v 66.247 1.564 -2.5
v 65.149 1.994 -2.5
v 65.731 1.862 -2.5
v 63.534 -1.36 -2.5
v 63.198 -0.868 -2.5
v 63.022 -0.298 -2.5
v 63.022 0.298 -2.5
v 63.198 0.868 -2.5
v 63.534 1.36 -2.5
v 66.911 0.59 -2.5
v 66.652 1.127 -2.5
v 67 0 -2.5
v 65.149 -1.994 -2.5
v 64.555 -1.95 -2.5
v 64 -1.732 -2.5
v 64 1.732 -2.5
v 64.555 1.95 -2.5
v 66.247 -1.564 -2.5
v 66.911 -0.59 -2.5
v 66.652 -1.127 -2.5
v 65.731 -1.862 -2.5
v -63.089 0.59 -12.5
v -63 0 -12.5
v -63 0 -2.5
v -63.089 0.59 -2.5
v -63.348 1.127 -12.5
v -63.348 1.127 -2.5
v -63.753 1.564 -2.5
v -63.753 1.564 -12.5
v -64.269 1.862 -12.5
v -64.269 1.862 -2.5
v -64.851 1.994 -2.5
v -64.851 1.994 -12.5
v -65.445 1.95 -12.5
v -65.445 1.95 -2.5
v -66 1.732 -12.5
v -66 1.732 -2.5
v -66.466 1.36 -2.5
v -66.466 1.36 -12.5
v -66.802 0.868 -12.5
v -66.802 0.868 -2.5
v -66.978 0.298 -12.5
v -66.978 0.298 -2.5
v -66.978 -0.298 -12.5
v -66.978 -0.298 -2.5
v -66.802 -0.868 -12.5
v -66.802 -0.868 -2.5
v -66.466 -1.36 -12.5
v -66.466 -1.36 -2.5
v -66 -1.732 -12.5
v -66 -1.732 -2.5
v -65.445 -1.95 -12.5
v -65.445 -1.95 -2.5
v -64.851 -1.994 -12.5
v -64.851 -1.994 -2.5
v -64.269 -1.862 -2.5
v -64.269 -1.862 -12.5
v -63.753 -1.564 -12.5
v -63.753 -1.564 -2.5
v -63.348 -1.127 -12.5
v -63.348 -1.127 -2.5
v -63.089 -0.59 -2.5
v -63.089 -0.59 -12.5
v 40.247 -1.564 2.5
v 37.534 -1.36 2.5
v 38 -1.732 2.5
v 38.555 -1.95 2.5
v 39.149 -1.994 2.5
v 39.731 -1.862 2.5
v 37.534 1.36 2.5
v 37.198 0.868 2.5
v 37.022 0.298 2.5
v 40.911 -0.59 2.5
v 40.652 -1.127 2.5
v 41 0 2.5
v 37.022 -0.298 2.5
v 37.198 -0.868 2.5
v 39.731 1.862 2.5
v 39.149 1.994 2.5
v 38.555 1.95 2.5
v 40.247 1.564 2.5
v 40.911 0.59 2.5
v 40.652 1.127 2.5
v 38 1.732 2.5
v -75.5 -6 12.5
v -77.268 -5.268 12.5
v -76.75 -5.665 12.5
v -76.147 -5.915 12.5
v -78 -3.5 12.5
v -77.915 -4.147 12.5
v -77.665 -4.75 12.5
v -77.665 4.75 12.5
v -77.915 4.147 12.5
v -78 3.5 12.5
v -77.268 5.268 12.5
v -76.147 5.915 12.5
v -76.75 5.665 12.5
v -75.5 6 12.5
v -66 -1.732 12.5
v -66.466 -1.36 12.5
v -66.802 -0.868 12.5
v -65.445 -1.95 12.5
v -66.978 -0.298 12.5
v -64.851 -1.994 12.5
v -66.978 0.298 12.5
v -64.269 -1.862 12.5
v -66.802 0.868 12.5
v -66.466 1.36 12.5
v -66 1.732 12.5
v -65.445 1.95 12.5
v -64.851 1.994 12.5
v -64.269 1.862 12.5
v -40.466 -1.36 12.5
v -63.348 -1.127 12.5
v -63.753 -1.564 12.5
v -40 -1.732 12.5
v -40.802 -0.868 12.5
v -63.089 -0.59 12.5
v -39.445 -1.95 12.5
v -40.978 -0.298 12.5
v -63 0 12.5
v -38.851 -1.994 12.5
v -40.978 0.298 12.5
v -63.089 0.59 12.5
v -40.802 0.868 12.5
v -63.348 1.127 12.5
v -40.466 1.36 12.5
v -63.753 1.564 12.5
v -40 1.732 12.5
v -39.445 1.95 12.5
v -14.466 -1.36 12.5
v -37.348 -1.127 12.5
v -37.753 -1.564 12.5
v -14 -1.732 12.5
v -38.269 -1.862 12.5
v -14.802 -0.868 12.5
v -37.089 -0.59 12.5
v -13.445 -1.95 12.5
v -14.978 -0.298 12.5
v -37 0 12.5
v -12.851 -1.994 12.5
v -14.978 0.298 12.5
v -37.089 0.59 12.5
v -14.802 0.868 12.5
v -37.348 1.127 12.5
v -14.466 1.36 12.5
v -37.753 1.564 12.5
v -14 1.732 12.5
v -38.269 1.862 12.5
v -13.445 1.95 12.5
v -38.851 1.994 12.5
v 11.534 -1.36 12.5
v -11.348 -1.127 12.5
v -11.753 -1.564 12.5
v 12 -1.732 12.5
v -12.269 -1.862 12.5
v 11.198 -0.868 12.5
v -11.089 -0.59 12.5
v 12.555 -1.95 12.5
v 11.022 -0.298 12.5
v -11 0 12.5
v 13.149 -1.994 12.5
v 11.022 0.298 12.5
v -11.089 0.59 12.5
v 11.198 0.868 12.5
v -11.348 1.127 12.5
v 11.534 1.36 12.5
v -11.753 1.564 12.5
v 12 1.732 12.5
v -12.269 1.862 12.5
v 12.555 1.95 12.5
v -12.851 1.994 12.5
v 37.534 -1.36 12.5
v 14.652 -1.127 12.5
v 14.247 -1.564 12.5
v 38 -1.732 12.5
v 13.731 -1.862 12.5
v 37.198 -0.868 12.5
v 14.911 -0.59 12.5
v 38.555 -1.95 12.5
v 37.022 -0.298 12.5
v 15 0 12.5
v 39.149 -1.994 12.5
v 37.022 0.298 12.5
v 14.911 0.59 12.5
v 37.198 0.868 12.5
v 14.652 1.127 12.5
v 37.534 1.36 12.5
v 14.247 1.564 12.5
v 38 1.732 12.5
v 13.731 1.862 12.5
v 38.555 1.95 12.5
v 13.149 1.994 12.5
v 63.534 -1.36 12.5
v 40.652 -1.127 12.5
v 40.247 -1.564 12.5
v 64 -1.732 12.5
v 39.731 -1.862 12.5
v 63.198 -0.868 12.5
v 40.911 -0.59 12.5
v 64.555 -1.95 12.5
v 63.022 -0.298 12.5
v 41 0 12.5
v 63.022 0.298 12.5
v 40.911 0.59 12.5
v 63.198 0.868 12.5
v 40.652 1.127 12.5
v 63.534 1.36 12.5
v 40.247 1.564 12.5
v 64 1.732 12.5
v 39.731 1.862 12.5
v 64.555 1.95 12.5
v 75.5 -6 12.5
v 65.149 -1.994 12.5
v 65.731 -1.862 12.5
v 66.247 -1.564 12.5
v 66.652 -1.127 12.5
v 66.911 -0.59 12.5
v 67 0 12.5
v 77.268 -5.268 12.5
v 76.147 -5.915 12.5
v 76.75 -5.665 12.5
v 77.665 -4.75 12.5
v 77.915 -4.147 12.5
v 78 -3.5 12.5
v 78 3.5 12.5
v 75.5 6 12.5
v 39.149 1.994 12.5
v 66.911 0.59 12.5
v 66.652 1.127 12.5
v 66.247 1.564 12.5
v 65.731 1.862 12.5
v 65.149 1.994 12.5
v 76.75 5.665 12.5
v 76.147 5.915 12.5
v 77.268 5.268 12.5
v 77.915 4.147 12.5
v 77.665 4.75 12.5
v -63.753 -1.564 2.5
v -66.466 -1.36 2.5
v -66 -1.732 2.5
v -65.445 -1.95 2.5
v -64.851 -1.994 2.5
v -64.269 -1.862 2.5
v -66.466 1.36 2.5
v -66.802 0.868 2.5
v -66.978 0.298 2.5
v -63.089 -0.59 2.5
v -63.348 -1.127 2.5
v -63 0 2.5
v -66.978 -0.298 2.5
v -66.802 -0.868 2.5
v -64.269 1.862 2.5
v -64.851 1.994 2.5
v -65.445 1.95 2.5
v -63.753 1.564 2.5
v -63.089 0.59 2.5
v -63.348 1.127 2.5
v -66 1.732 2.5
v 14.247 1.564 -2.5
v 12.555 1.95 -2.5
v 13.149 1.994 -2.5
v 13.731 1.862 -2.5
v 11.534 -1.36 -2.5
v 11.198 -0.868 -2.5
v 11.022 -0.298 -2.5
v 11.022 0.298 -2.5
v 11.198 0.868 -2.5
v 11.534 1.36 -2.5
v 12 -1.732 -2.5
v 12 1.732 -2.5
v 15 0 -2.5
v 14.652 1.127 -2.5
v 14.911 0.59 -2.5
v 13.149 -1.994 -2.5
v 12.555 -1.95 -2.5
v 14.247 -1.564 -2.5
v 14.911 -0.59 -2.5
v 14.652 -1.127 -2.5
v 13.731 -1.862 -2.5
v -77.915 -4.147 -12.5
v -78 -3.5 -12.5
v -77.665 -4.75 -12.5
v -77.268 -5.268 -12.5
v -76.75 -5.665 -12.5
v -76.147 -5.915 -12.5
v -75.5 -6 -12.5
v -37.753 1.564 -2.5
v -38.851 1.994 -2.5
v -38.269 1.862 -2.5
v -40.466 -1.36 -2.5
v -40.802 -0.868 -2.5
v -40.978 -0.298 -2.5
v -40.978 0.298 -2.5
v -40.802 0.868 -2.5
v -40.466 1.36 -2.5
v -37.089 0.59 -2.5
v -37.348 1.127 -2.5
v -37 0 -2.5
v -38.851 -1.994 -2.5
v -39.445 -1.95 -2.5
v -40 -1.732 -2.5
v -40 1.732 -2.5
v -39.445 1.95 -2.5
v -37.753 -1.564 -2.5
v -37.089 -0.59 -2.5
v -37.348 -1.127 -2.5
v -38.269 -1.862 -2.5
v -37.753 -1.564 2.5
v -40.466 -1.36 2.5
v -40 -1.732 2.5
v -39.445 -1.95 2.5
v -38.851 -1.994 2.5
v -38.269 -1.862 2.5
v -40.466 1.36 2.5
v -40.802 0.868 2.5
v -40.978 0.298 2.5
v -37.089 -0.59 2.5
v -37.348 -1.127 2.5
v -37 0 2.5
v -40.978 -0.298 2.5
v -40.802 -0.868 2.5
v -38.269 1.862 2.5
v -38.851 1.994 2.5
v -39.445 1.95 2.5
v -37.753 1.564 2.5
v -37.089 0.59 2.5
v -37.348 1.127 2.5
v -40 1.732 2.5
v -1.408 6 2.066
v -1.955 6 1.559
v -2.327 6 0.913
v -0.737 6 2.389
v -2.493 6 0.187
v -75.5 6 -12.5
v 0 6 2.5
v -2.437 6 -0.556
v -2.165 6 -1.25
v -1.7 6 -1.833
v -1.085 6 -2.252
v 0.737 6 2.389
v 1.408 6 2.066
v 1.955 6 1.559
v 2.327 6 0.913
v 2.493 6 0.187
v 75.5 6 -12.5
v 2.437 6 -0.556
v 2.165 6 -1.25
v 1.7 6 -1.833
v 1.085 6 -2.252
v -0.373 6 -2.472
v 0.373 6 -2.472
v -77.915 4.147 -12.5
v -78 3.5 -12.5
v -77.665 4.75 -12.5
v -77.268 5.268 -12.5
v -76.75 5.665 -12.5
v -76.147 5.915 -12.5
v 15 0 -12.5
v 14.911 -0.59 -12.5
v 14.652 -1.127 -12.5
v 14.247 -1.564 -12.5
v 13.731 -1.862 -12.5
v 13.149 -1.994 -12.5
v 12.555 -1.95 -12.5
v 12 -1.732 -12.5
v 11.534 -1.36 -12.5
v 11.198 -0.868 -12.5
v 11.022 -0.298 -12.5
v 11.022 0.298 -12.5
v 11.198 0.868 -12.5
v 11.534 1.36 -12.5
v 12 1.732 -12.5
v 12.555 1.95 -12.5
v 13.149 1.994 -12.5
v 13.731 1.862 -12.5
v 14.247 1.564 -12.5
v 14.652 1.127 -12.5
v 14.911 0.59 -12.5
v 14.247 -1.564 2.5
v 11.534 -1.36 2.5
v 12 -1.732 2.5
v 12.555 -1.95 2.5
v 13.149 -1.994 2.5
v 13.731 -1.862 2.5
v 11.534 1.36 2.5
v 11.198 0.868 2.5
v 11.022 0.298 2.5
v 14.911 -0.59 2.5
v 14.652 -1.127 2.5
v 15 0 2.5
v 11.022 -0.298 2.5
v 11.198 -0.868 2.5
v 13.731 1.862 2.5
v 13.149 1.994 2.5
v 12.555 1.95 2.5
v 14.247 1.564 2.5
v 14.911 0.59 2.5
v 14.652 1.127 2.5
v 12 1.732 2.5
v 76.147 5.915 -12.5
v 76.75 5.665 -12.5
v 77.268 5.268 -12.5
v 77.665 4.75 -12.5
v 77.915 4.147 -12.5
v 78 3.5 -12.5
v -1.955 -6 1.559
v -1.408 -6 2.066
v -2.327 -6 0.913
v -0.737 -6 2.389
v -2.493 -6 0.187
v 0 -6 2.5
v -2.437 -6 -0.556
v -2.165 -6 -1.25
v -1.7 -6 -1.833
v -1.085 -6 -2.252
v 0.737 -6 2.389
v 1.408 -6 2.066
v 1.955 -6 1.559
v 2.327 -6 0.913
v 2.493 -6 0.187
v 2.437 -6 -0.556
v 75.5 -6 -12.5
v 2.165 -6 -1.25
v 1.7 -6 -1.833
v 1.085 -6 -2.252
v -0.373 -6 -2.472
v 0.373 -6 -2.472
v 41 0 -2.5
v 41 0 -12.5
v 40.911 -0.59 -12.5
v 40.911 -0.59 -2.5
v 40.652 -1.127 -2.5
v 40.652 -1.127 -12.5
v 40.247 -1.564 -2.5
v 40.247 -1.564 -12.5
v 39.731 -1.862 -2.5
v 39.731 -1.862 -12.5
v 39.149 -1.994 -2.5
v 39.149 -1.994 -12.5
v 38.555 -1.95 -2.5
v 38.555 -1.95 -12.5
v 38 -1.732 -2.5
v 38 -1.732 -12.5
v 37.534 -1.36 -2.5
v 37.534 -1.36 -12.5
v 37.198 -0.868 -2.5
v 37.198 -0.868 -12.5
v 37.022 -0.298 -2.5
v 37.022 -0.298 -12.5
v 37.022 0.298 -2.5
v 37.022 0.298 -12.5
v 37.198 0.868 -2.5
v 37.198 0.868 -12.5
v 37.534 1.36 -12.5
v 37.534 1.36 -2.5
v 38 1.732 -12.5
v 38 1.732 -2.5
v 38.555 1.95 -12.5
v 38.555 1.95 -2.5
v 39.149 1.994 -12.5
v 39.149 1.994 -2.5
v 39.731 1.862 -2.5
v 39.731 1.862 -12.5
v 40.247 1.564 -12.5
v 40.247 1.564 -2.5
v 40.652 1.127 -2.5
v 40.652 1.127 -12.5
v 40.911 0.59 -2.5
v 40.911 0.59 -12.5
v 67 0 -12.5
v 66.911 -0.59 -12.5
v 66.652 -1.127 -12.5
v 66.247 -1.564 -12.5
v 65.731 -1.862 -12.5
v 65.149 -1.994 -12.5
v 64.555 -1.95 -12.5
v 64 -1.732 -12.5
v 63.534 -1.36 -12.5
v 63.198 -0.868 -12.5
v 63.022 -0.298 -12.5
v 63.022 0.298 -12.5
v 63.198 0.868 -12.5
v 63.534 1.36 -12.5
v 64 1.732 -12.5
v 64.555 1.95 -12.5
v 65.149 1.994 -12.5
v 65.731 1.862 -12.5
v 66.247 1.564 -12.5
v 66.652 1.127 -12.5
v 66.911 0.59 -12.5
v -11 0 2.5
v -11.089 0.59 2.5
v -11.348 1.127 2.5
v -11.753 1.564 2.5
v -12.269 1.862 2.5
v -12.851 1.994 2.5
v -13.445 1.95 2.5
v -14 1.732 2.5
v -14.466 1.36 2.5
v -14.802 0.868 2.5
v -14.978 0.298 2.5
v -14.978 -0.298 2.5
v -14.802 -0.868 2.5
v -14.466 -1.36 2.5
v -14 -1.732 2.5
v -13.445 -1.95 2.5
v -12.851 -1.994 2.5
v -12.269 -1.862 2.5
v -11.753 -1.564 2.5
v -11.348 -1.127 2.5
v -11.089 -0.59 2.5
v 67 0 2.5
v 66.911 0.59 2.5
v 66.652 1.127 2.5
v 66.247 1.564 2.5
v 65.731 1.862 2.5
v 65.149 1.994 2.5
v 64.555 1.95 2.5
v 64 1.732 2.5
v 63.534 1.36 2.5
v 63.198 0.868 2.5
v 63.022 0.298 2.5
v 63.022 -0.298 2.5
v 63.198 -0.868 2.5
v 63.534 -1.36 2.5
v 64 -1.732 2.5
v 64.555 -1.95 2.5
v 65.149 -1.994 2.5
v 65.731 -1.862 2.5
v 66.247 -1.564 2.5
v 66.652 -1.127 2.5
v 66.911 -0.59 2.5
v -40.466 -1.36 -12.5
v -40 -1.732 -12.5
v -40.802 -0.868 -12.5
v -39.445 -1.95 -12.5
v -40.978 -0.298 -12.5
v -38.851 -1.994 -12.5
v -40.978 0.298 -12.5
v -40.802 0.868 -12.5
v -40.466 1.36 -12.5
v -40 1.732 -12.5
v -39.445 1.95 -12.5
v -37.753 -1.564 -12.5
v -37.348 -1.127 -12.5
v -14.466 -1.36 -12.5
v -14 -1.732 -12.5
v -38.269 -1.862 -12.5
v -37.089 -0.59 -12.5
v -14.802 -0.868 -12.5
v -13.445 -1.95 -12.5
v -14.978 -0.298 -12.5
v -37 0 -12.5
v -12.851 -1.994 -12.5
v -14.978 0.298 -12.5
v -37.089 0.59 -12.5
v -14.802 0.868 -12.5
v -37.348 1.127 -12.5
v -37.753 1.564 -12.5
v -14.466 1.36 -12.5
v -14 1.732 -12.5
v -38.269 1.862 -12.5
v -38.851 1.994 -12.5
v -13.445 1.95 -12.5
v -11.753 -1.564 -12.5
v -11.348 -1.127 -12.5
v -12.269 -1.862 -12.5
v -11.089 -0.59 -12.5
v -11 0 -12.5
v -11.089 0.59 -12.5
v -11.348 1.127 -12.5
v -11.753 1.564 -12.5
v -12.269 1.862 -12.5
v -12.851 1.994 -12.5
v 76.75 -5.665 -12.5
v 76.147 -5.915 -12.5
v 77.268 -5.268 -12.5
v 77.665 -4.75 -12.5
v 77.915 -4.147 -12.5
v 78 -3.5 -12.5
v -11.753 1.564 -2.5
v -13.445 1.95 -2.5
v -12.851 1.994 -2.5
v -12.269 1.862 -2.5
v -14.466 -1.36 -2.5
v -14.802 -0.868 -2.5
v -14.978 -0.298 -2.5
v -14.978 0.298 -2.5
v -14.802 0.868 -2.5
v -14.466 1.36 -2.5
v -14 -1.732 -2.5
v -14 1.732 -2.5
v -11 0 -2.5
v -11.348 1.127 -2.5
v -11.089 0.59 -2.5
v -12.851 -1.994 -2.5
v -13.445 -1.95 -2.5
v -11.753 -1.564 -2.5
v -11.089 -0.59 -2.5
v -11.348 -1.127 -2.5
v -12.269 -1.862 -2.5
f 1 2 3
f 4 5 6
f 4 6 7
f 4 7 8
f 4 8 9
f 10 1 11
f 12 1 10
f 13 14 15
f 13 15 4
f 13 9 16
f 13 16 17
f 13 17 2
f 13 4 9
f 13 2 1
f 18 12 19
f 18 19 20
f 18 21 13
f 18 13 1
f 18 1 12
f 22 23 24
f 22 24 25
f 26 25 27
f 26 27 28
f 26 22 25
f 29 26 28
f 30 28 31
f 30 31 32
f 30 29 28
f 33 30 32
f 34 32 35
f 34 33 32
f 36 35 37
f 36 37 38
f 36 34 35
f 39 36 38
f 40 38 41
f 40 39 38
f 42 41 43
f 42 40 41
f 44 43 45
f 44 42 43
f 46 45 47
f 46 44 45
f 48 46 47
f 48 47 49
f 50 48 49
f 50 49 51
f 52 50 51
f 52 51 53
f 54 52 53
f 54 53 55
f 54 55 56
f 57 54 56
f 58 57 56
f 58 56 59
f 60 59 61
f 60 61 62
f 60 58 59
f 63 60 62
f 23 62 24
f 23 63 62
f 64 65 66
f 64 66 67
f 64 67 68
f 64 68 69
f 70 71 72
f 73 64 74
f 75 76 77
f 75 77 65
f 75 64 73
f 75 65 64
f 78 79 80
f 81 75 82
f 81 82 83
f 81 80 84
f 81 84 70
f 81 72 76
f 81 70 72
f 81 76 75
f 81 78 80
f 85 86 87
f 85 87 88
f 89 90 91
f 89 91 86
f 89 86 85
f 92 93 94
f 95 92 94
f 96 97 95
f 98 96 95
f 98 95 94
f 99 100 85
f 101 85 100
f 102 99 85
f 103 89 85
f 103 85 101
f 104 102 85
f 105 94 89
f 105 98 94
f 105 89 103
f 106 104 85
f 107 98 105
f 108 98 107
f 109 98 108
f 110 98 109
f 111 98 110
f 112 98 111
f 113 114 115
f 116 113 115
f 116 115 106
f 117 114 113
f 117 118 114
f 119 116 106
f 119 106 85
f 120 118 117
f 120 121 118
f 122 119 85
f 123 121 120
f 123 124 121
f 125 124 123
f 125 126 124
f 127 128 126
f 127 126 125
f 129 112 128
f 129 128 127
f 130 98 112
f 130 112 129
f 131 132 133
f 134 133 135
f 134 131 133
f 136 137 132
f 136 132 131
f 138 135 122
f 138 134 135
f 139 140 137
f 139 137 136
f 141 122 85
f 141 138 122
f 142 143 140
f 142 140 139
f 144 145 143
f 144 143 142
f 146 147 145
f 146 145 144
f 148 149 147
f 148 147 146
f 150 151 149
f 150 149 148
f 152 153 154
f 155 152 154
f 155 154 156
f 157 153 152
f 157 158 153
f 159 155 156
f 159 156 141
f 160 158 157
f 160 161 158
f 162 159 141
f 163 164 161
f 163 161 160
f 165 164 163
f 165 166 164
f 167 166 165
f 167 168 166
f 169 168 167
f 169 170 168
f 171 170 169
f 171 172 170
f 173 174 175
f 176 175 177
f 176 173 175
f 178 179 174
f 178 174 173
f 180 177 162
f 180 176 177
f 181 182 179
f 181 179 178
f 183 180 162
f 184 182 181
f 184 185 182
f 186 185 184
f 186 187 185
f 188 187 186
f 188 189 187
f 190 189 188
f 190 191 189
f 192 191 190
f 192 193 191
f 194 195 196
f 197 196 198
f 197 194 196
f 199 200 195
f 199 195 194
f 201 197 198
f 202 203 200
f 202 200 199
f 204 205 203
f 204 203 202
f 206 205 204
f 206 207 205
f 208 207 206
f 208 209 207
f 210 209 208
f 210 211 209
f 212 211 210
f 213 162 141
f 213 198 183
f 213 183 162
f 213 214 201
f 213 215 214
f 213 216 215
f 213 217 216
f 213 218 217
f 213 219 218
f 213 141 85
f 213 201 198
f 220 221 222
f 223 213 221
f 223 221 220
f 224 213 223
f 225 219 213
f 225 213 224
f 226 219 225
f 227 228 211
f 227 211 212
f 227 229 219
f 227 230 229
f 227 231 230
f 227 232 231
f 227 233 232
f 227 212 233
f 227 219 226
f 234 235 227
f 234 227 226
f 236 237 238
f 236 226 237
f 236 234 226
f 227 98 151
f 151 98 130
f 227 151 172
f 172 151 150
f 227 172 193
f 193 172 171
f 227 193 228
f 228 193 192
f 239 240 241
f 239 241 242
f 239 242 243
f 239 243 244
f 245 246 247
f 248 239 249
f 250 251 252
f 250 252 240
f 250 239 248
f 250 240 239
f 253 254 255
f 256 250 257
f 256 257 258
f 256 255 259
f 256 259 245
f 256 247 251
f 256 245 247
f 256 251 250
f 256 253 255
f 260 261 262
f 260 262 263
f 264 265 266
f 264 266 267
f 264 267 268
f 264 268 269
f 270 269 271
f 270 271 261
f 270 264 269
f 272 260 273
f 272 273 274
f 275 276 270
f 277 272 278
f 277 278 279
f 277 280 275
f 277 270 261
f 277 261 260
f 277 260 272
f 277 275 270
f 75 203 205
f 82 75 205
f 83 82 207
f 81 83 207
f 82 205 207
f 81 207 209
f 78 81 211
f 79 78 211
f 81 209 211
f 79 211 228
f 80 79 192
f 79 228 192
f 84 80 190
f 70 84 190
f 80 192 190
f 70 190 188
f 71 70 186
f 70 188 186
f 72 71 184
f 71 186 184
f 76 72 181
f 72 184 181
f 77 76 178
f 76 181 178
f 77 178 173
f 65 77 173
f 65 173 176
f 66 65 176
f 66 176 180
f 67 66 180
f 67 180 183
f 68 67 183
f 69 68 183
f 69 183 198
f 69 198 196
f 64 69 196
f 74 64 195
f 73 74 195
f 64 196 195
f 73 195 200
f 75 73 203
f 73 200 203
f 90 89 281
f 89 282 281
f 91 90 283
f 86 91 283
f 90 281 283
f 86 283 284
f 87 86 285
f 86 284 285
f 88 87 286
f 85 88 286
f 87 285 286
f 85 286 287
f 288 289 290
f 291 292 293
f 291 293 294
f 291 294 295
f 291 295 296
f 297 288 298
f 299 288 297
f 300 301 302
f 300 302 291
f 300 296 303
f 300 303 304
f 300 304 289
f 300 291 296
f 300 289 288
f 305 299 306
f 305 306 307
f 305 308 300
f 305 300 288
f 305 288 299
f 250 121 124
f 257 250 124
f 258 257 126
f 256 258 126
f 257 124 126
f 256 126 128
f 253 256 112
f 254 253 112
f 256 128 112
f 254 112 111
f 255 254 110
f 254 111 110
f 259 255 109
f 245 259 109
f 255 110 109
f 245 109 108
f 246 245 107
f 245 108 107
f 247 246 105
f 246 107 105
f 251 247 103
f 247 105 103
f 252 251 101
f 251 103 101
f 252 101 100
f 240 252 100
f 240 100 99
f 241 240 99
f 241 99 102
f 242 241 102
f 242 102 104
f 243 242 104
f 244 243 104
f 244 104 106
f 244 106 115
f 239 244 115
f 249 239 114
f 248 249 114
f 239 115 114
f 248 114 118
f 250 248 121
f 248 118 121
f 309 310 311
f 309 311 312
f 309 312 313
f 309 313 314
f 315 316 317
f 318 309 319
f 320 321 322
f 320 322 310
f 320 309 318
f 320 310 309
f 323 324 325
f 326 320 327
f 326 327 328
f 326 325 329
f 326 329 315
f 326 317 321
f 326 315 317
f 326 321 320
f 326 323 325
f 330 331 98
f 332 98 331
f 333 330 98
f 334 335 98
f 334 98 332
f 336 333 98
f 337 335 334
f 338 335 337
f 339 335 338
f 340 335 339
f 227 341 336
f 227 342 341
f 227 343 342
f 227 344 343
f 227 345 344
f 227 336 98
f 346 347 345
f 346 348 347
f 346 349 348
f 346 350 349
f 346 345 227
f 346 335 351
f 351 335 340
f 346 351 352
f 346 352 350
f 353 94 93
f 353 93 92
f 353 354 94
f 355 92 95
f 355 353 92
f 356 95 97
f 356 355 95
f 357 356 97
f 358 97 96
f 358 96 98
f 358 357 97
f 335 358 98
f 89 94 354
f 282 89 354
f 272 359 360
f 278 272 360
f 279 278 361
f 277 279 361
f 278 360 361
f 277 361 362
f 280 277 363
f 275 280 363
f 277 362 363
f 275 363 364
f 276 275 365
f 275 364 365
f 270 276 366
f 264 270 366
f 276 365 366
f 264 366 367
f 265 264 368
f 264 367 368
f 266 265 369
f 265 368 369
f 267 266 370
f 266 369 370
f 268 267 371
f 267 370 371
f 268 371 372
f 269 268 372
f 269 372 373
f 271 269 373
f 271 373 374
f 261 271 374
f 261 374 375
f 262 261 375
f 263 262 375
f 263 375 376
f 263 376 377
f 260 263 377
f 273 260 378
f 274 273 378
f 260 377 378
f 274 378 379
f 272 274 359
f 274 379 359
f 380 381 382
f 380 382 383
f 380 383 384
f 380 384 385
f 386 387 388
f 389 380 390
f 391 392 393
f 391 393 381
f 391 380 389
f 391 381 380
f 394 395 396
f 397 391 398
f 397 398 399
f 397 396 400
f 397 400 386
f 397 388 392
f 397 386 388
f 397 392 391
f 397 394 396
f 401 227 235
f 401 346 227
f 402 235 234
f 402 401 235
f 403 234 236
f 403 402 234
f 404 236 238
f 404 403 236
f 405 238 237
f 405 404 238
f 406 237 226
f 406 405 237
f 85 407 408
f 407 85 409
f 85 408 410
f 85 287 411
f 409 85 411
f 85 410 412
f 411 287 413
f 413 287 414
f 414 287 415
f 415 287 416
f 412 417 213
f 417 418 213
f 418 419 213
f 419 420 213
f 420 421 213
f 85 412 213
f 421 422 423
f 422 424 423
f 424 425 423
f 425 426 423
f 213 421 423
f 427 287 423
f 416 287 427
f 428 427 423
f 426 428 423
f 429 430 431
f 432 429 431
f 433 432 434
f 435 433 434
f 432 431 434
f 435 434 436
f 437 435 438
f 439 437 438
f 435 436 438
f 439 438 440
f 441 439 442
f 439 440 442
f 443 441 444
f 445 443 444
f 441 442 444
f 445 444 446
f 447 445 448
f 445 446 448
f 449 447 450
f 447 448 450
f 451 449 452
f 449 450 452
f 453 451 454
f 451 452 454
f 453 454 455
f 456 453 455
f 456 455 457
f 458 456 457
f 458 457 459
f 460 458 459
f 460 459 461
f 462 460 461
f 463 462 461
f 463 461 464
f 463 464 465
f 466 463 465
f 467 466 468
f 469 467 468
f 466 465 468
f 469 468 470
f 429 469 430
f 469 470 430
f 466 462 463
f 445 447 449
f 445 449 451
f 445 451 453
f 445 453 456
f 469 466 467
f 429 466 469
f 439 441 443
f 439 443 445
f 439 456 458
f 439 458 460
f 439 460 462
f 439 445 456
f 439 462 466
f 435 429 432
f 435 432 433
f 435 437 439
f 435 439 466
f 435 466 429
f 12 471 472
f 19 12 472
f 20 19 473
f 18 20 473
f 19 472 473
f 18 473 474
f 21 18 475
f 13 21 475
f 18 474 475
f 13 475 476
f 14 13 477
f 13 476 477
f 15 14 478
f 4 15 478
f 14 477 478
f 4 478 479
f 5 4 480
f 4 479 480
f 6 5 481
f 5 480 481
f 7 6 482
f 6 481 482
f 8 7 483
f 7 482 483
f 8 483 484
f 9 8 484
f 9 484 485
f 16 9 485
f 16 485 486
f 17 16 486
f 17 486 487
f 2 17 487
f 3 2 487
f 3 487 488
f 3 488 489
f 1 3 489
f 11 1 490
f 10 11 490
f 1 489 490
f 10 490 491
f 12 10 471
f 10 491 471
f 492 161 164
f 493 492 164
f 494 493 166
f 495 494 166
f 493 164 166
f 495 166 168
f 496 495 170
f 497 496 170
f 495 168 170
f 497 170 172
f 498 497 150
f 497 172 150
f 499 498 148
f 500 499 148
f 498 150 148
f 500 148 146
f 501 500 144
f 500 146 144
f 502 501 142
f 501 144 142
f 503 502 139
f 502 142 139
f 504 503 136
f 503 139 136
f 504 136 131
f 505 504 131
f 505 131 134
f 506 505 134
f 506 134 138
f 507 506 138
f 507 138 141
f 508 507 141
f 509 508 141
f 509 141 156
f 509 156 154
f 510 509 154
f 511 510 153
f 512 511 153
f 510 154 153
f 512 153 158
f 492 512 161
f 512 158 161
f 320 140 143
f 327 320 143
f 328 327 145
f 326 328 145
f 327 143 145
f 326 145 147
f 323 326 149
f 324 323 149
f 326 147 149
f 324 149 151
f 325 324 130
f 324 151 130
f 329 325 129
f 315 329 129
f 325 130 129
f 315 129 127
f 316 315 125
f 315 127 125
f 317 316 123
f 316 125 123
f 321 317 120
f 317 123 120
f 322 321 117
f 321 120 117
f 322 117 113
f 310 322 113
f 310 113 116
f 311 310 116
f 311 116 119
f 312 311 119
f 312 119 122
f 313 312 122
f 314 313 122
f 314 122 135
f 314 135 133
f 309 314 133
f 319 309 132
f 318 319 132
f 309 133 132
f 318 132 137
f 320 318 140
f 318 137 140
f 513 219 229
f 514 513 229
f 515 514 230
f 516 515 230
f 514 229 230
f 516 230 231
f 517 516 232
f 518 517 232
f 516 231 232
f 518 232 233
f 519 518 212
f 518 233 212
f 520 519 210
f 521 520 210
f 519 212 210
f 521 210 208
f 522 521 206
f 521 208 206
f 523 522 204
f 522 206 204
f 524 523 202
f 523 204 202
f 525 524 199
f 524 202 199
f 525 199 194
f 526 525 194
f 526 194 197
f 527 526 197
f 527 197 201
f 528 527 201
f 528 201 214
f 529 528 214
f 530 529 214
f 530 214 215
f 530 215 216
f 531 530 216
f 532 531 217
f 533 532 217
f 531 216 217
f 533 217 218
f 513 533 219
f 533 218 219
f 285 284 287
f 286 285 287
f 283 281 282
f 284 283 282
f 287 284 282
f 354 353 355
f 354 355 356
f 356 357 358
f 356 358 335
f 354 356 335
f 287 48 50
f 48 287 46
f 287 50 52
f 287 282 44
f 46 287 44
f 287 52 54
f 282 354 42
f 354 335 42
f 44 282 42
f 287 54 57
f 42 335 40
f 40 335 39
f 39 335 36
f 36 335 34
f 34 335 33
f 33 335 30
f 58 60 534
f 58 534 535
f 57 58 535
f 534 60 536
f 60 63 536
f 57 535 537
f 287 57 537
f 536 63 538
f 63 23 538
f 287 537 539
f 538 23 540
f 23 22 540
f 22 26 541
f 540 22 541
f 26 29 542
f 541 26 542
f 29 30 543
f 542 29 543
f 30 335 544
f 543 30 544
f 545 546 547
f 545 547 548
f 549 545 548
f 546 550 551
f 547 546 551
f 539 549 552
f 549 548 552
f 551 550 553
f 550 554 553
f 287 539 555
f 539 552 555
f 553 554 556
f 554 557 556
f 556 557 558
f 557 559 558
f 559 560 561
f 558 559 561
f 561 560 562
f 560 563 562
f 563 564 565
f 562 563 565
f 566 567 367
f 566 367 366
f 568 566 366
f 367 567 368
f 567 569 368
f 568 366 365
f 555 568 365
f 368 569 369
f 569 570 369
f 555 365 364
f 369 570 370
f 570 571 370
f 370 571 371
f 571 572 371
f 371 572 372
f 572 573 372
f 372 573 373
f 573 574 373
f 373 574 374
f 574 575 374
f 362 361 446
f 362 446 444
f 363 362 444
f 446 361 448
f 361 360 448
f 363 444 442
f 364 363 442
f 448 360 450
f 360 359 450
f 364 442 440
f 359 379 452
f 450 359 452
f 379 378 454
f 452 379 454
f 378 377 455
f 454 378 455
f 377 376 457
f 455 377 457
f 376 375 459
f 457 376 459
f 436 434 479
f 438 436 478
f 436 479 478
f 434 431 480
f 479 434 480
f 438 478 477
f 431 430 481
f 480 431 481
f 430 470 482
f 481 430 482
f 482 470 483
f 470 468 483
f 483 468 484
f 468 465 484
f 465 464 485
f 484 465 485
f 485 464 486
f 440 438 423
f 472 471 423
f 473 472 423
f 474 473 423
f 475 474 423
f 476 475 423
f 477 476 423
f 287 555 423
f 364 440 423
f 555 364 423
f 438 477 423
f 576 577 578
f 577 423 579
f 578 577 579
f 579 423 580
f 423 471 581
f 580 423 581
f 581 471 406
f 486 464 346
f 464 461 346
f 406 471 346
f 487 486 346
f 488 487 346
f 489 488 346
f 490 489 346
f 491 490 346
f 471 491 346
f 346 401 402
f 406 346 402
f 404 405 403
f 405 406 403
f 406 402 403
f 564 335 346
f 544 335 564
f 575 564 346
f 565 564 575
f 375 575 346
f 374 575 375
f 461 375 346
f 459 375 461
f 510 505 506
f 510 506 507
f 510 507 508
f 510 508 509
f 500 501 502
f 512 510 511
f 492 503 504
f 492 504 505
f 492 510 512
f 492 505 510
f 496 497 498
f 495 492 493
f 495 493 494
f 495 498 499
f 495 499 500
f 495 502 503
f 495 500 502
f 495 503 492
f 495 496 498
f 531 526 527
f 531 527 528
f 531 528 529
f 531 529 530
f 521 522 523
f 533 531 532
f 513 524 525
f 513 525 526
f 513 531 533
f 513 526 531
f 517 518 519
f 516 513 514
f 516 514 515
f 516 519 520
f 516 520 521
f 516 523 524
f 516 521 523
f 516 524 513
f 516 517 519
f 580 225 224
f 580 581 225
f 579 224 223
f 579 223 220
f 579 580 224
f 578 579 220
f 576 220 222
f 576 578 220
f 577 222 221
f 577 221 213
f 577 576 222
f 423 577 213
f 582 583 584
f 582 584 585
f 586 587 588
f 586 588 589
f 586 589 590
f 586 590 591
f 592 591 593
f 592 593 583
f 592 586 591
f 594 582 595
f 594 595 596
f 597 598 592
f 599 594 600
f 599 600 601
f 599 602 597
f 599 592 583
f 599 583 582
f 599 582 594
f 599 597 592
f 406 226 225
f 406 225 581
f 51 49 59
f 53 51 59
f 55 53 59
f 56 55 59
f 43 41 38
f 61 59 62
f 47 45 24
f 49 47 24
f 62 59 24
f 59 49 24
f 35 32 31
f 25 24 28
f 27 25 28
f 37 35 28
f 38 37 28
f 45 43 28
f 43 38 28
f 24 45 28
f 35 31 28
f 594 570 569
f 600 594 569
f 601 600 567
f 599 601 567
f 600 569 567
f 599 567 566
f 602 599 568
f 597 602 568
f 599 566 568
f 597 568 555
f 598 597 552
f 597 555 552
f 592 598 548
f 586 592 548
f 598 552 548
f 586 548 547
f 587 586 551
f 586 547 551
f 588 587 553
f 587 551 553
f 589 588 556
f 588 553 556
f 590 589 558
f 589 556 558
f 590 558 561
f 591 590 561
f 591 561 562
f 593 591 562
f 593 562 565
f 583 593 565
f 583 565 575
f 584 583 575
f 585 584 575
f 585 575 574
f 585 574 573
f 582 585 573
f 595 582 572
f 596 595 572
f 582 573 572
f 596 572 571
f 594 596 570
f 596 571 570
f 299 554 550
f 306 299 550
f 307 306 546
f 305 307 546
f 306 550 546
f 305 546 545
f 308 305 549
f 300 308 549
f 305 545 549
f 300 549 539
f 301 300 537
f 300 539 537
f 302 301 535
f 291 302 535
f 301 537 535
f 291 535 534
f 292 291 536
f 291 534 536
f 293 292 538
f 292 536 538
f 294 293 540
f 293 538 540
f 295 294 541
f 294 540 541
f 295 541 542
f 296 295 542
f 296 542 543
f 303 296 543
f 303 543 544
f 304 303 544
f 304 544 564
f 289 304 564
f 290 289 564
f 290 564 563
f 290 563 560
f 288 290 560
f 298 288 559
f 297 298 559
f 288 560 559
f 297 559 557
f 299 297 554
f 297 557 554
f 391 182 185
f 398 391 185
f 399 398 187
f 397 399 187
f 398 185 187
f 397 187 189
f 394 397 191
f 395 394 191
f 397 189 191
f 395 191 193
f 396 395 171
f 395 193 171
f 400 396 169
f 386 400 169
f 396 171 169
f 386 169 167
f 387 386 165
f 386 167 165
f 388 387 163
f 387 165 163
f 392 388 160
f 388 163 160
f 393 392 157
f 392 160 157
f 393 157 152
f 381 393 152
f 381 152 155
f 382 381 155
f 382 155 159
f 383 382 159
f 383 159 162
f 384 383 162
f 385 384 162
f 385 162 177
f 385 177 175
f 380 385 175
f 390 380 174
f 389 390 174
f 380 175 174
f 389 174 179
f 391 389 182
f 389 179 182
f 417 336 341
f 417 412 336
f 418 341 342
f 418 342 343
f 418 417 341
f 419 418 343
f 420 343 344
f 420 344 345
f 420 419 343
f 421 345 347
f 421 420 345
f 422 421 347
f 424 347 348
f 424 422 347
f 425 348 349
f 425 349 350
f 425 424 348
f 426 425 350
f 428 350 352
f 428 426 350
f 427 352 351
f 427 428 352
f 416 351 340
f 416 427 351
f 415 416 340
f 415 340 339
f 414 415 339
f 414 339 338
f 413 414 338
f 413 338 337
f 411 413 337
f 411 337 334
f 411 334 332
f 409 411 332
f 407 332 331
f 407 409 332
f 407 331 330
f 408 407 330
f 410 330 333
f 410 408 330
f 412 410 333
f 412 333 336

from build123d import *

# Parameters (mm, degrees)
SKETCH1_W               = 156
SKETCH1_H               = 25
SKETCH1_R               = 2.5
BOSS_EXTRUDE1_DEPTH     = 6
FILLET1_R               = 2.5
SKETCH2_R               = 2
CUT_EXTRUDE1_DEPTH      = 10
LPATTERN1_COUNT         = 6
LPATTERN1_PITCH         = 26
MIRROR1_COPY_1_SKETCH_R = 2
MIRROR1_COPY_1_DEPTH    = 10
MIRROR1_COPY_2_SKETCH_R = 2
MIRROR1_COPY_2_DEPTH    = 10
MIRROR1_COPY_3_SKETCH_R = 2
MIRROR1_COPY_3_DEPTH    = 10
MIRROR1_COPY_4_SKETCH_R = 2
MIRROR1_COPY_4_DEPTH    = 10
MIRROR1_COPY_5_SKETCH_R = 2
MIRROR1_COPY_5_DEPTH    = 10


with BuildPart() as part:
    # Sketch1 → Boss-Extrude1 (new, symmetric)
    with BuildSketch(Plane(origin=(0, 0, 0), x_dir=(1, 0, 0), z_dir=(0, 1, 0))):
        Rectangle(SKETCH1_W, SKETCH1_H)
        with Locations(Location((0, 0, 0), (0, 0, 270))):
            Circle(SKETCH1_R, mode=Mode.SUBTRACT)
    extrude(amount=BOSS_EXTRUDE1_DEPTH, both=True)

    # Fillet1
    fillet1_edges = [part.edges().sort_by_distance(p)[0] for p in [
        (-78, 6, 0),
        (78, 6, 0),
        (-78, -6, 0),
        (78, -6, 0),
    ]]
    fillet(fillet1_edges, radius=FILLET1_R)

    # Sketch2 → Cut-Extrude1 (cut)
    with BuildSketch(Plane.XY.offset(12.5)):
        with Locations((-65, 0)):
            Circle(SKETCH2_R)
    cut_extrude1 = extrude(amount=-CUT_EXTRUDE1_DEPTH, mode=Mode.SUBTRACT)

    # LPattern1: Cut-Extrude1 ×6
    with Locations(*[(i * LPATTERN1_PITCH, 0, 0) for i in range(1, LPATTERN1_COUNT)]):
        add(cut_extrude1, mode=Mode.SUBTRACT)

    # Mirror1: Cut-Extrude1 across plane
    add(cut_extrude1.mirror(Plane.XY), mode=Mode.SUBTRACT)

    # Mirror1 copy 1 sketch → Mirror1 copy 1 (cut)
    with BuildSketch(Plane(origin=(26, 0, -12.5), x_dir=(1, 0, 0), z_dir=(0, 0, -1))):
        with Locations((-65, 0)):
            Circle(MIRROR1_COPY_1_SKETCH_R)
    extrude(amount=-MIRROR1_COPY_1_DEPTH, mode=Mode.SUBTRACT)

    # Mirror1 copy 2 sketch → Mirror1 copy 2 (cut)
    with BuildSketch(Plane(origin=(52, 0, -12.5), x_dir=(1, 0, 0), z_dir=(0, 0, -1))):
        with Locations((-65, 0)):
            Circle(MIRROR1_COPY_2_SKETCH_R)
    extrude(amount=-MIRROR1_COPY_2_DEPTH, mode=Mode.SUBTRACT)

    # Mirror1 copy 3 sketch → Mirror1 copy 3 (cut)
    with BuildSketch(Plane(origin=(78, 0, -12.5), x_dir=(1, 0, 0), z_dir=(0, 0, -1))):
        with Locations((-65, 0)):
            Circle(MIRROR1_COPY_3_SKETCH_R)
    extrude(amount=-MIRROR1_COPY_3_DEPTH, mode=Mode.SUBTRACT)

    # Mirror1 copy 4 sketch → Mirror1 copy 4 (cut)
    with BuildSketch(Plane(origin=(104, 0, -12.5), x_dir=(1, 0, 0), z_dir=(0, 0, -1))):
        with Locations((-65, 0)):
            Circle(MIRROR1_COPY_4_SKETCH_R)
    extrude(amount=-MIRROR1_COPY_4_DEPTH, mode=Mode.SUBTRACT)

    # Mirror1 copy 5 sketch → Mirror1 copy 5 (cut)
    with BuildSketch(Plane(origin=(130, 0, -12.5), x_dir=(1, 0, 0), z_dir=(0, 0, -1))):
        with Locations((-65, 0)):
            Circle(MIRROR1_COPY_5_SKETCH_R)
    extrude(amount=-MIRROR1_COPY_5_DEPTH, mode=Mode.SUBTRACT)


solid = part.part
